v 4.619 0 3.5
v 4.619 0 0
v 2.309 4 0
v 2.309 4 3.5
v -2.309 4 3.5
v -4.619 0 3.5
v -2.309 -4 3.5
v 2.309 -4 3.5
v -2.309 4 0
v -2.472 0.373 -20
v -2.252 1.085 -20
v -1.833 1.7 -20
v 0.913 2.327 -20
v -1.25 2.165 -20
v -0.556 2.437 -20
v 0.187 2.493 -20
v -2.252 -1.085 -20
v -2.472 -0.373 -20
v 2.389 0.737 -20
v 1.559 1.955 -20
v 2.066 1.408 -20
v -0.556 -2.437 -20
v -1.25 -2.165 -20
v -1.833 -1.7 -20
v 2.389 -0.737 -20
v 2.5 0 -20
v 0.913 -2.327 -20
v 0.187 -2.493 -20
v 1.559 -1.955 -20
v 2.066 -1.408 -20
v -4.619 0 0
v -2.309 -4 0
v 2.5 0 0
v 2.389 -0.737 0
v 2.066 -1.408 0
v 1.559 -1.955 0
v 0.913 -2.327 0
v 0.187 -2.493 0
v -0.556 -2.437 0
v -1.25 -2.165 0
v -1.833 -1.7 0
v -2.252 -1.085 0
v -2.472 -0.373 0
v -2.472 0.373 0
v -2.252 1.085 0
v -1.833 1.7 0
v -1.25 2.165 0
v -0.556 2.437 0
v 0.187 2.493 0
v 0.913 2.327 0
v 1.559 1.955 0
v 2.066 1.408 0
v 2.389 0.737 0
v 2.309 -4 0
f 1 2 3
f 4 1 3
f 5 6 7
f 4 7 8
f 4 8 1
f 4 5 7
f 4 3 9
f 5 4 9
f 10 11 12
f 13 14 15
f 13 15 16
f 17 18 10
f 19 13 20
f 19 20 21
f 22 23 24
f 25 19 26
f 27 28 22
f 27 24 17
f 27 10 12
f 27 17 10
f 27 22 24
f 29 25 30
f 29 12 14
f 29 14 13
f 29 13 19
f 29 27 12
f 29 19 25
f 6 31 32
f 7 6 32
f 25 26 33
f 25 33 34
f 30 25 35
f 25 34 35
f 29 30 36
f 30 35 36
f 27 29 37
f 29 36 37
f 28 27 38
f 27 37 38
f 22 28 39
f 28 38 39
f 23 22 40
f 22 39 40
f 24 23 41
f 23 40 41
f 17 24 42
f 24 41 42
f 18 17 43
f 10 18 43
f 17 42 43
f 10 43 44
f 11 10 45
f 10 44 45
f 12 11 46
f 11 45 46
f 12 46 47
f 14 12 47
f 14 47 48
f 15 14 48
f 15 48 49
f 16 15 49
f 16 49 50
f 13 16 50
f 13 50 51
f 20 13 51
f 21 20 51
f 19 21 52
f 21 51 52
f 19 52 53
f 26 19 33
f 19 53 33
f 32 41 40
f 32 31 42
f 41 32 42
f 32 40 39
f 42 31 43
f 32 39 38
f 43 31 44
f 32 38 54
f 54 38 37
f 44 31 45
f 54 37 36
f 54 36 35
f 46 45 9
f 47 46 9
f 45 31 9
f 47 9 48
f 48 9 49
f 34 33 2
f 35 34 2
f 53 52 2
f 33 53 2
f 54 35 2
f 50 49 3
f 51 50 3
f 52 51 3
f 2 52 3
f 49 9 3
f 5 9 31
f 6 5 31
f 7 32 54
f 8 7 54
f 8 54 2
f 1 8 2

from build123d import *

# Parameters (mm, degrees)
SALIENTE_EXTRUIR1_DEPTH = 3.5
CROQUIS2_R              = 2.5
SALIENTE_EXTRUIR2_DEPTH = 20


with BuildPart() as part:
    # Croquis1 → Saliente-Extruir1 (new body)
    with BuildSketch(Plane.XY):
        Polygon((4.618802154, 0), (2.309401077, 4), (-2.309401077, 4), (-4.618802154, 0), (-2.309401077, -4), (2.309401077, -4), align=None)
    extrude(amount=SALIENTE_EXTRUIR1_DEPTH)

    # Croquis2 → Saliente-Extruir2 (add)
    with BuildSketch(Plane(origin=(0, 0, 0), x_dir=(-1, 0, 0), z_dir=(0, 0, -1))):
        with Locations(Location((0, 0, 0), (0, 0, 180))):
            Circle(CROQUIS2_R)
    extrude(amount=SALIENTE_EXTRUIR2_DEPTH)


solid = part.part
